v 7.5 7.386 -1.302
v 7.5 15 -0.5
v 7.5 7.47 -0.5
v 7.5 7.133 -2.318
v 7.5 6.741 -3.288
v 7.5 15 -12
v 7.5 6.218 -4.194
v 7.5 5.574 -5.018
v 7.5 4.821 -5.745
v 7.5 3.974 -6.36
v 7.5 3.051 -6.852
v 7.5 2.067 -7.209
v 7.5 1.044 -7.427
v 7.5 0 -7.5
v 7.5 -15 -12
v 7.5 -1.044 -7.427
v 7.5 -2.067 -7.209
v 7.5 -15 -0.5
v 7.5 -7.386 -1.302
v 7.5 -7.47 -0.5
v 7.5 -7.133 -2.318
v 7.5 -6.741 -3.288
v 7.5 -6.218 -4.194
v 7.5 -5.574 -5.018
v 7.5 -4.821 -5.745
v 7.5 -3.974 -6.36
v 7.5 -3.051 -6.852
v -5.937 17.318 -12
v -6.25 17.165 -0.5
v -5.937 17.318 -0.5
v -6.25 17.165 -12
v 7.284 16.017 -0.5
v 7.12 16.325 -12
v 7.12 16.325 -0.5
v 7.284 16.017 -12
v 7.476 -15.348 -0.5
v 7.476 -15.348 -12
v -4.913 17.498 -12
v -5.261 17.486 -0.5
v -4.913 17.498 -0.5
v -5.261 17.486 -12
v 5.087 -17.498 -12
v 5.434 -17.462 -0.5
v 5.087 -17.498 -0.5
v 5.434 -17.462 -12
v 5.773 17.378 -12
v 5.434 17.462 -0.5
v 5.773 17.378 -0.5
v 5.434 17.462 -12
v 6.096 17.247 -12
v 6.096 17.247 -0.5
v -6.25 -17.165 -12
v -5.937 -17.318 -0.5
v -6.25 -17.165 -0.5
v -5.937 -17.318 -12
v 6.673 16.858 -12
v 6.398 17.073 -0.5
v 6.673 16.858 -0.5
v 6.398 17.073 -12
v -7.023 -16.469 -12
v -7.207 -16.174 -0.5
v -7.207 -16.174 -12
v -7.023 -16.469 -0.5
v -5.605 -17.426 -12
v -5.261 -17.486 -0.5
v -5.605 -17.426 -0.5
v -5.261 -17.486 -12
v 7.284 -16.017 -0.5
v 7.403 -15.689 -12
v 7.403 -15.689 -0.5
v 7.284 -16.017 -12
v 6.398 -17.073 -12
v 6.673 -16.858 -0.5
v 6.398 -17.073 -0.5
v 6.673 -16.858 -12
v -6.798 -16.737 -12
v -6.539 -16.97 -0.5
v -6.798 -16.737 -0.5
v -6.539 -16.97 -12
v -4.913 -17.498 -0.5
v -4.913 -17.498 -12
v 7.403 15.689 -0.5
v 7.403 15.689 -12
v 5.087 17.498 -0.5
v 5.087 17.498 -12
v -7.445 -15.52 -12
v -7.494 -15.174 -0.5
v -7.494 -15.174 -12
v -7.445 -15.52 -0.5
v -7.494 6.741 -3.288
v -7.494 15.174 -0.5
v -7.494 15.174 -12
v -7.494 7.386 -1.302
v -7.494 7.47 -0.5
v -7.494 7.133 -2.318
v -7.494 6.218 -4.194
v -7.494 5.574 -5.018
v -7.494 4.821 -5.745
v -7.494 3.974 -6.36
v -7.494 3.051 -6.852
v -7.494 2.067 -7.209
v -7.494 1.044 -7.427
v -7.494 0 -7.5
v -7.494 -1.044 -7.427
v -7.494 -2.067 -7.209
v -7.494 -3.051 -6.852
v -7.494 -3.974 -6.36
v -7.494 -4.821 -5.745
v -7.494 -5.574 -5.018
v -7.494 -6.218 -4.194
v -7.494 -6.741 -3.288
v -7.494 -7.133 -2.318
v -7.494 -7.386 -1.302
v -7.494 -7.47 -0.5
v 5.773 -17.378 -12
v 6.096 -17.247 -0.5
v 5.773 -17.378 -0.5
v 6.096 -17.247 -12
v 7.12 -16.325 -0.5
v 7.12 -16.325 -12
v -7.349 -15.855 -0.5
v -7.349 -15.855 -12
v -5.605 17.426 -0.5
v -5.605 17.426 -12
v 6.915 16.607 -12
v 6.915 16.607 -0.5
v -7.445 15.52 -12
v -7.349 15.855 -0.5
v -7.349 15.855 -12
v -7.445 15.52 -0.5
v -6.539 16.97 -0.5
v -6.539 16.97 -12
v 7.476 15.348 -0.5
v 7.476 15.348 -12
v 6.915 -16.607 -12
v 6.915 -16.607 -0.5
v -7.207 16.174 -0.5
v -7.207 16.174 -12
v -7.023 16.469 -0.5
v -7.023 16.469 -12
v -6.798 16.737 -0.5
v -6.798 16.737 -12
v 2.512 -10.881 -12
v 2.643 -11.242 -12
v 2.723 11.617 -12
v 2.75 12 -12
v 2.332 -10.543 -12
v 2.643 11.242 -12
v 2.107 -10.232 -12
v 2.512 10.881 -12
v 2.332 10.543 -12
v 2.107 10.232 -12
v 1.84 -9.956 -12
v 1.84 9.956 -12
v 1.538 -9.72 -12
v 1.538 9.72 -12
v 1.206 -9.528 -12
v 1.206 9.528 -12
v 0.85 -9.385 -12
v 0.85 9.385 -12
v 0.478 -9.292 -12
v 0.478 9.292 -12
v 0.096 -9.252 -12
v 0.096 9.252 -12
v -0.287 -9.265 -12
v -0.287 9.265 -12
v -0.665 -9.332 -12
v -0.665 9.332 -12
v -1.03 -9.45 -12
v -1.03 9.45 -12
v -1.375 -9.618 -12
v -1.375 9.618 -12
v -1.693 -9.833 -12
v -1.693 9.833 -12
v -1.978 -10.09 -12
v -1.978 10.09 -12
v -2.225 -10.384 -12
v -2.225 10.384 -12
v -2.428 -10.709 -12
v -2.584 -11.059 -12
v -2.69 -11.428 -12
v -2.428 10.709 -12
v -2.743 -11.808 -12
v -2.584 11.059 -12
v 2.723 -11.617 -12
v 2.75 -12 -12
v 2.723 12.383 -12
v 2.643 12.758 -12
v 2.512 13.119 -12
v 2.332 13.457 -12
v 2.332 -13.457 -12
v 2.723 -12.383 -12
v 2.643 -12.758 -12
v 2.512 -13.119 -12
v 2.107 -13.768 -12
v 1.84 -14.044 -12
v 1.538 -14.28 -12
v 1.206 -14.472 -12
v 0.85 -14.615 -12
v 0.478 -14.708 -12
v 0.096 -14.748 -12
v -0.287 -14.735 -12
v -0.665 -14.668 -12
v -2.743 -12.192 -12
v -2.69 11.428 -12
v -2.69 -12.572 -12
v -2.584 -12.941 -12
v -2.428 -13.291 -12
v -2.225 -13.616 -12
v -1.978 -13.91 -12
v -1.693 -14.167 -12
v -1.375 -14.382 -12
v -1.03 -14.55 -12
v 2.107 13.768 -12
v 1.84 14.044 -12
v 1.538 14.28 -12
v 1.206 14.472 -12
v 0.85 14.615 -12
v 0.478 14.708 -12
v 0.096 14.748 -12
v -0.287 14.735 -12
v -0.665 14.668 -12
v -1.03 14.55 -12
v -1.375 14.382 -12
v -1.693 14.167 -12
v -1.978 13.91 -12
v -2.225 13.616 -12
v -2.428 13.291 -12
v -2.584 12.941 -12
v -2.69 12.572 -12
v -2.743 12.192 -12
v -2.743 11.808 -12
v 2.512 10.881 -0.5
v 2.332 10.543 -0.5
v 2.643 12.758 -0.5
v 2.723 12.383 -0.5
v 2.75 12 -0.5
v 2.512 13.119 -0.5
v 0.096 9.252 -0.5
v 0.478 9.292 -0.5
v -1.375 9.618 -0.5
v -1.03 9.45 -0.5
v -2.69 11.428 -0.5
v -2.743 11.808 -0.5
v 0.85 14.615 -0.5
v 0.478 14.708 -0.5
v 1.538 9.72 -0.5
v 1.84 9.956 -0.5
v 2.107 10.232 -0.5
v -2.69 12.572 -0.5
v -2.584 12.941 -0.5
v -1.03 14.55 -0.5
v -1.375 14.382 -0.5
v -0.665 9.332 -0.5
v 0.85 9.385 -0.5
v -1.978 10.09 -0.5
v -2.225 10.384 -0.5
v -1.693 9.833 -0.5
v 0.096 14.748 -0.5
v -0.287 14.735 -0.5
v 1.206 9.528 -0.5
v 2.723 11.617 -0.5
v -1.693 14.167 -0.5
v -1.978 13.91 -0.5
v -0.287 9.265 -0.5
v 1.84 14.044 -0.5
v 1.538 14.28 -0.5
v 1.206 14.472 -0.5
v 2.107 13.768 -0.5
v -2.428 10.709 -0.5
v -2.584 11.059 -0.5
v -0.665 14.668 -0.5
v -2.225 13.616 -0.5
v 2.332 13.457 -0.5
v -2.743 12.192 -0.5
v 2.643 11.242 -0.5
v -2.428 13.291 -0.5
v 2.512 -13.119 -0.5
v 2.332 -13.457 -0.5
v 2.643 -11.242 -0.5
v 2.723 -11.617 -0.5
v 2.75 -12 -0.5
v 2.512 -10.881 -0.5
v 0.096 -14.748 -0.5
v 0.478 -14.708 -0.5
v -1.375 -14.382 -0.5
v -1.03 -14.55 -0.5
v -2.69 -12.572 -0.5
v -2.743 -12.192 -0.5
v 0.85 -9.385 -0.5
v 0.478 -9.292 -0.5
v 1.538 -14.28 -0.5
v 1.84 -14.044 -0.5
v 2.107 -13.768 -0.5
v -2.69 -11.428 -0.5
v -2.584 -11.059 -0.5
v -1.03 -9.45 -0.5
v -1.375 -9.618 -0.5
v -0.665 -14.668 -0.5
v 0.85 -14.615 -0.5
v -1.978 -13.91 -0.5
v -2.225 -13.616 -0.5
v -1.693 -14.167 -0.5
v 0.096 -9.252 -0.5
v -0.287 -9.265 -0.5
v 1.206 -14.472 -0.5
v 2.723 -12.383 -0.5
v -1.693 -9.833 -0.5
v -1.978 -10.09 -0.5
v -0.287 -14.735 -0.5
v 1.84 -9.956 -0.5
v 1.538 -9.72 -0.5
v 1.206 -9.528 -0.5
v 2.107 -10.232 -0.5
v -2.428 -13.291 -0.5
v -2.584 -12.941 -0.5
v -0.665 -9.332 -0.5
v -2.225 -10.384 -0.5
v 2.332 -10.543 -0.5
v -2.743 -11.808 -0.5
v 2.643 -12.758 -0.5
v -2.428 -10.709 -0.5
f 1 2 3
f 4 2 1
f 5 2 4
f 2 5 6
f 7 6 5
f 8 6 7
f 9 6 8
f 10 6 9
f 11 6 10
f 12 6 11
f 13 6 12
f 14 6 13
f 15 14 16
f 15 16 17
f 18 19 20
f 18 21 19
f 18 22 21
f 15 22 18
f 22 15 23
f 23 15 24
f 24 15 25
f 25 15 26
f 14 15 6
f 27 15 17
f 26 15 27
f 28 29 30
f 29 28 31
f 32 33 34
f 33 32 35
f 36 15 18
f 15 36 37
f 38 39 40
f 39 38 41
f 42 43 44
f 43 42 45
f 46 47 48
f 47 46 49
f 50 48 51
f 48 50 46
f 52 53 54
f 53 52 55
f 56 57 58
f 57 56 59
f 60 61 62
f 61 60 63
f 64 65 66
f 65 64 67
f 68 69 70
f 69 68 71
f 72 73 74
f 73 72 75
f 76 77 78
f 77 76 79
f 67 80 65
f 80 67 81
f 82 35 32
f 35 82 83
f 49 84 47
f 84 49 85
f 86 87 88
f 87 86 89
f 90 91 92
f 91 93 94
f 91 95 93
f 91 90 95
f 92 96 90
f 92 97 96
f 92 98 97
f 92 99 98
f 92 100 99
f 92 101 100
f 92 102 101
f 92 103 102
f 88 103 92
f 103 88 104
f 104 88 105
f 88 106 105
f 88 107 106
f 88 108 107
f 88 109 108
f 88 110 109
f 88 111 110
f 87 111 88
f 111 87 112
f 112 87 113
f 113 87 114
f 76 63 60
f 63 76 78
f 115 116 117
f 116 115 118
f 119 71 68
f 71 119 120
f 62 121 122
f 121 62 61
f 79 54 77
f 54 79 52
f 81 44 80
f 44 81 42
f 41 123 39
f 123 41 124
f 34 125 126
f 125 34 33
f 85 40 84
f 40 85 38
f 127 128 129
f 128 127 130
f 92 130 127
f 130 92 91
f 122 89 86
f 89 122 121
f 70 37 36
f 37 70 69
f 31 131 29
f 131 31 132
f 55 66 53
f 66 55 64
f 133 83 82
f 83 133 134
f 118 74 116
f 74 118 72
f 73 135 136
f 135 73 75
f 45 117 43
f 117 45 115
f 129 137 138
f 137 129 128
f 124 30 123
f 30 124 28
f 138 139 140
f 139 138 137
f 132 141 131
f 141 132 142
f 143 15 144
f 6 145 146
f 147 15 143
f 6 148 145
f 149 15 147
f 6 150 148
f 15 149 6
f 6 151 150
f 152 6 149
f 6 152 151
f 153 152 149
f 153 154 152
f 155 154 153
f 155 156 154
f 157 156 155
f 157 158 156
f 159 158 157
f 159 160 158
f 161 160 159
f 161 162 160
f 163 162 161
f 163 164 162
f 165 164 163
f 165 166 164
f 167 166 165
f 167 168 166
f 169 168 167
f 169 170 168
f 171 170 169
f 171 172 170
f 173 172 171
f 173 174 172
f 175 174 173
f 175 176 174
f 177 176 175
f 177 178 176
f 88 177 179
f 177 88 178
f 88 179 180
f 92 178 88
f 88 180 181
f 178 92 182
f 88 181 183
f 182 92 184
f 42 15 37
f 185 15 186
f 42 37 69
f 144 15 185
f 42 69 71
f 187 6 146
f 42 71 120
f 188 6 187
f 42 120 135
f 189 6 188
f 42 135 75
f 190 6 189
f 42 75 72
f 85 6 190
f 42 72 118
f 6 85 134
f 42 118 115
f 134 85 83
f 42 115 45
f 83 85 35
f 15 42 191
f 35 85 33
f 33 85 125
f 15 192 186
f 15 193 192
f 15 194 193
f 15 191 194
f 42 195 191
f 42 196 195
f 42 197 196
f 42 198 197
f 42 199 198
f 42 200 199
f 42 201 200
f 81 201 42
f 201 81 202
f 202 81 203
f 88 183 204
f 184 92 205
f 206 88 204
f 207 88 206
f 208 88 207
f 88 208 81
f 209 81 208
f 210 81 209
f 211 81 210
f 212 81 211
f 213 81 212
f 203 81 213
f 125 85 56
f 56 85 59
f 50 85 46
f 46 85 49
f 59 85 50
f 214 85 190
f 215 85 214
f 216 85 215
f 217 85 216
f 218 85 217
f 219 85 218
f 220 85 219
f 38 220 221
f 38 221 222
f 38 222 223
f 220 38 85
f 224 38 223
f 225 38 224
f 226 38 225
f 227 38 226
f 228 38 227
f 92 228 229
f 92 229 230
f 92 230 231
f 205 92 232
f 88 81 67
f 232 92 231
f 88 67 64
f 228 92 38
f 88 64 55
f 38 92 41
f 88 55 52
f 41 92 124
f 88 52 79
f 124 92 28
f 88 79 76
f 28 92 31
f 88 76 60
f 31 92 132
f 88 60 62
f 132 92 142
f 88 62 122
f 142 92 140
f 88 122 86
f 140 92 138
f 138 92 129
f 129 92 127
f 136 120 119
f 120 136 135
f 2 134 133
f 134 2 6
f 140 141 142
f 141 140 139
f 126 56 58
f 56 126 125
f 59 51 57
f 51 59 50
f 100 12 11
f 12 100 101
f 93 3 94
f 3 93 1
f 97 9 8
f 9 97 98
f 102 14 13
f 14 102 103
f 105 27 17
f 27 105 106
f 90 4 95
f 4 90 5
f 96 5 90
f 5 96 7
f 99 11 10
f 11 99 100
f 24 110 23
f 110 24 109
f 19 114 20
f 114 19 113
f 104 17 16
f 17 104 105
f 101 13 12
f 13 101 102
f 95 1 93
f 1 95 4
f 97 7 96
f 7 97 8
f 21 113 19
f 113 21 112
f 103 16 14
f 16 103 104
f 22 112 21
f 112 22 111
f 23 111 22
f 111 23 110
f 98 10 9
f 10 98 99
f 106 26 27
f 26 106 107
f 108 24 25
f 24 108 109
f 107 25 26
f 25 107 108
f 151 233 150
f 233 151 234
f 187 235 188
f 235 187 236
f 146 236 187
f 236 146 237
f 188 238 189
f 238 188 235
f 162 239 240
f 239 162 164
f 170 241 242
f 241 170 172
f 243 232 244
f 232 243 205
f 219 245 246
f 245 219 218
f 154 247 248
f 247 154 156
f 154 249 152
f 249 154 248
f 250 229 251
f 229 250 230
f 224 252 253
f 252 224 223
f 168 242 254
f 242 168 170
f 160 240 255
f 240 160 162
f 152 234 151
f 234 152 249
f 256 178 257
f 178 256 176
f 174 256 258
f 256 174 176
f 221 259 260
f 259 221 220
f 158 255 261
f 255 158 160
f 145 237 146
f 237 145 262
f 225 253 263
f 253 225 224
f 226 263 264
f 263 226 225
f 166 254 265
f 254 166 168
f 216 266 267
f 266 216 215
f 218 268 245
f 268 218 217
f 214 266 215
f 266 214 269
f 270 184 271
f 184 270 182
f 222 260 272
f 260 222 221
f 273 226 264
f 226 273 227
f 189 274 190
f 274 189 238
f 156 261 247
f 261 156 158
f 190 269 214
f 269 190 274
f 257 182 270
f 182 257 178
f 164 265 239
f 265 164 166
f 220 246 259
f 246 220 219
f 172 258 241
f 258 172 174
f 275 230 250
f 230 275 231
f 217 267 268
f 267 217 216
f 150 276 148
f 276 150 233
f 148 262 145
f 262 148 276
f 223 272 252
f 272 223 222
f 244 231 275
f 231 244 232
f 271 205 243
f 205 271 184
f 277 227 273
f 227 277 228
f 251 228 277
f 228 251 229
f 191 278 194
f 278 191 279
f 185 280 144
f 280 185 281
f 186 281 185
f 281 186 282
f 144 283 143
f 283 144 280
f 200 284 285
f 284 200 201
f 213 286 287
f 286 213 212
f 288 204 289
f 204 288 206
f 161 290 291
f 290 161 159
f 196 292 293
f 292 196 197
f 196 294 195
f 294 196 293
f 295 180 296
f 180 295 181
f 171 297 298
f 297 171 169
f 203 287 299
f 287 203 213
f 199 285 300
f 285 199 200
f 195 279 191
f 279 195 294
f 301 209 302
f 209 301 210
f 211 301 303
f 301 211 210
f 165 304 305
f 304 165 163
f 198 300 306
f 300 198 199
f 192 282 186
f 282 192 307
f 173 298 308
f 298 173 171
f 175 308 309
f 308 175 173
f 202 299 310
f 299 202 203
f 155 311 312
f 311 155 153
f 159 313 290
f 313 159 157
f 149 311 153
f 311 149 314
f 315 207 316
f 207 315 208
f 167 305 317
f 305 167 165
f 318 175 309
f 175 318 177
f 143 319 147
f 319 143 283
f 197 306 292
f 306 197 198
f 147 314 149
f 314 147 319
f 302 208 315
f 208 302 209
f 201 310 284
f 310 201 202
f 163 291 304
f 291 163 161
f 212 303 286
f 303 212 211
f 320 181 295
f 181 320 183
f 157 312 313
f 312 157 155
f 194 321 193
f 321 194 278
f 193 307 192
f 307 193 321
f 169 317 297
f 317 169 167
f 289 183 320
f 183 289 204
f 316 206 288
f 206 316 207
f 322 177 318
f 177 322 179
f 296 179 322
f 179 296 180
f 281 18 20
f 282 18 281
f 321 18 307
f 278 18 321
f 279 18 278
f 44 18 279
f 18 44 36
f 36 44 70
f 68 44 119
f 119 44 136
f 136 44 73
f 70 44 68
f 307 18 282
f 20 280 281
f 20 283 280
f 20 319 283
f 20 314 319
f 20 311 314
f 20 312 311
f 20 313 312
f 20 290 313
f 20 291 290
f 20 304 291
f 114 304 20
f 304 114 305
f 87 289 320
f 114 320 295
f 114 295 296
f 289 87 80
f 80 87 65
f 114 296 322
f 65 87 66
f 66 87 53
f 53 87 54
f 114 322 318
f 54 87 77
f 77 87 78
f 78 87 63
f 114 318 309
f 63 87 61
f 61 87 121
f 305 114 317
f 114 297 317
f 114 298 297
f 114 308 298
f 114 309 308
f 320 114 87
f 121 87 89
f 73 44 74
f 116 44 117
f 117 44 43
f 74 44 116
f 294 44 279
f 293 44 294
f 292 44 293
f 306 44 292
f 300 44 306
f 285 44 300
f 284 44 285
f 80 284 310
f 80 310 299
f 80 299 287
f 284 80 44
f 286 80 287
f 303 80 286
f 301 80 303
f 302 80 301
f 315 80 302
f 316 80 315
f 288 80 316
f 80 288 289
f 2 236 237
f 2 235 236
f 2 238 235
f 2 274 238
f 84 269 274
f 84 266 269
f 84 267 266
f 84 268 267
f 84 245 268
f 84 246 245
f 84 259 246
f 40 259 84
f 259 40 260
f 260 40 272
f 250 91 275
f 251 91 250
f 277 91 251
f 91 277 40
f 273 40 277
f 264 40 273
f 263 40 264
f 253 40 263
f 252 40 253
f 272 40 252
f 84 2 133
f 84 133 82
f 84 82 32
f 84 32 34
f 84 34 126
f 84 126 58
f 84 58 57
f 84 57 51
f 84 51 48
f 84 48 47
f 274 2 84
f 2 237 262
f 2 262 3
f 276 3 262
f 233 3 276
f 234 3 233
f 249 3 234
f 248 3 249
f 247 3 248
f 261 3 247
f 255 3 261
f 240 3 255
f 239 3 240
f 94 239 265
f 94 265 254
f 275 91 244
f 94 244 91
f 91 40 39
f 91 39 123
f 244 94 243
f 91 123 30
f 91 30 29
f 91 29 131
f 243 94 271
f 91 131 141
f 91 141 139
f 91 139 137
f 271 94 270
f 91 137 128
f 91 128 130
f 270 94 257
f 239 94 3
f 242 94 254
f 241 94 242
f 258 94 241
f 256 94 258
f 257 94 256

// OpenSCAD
$fn=45;
difference() {
  translate([0, 0, -0.5]) minkowski() {
    cube([10,30,23], center=true);
    cylinder(h = 1, r = 2.5);
  }
  rotate([0, 90, 0]) cylinder(h=17, r=7.5, center=true);
  translate([0, 12, 0]) cylinder(h = 27, r = 2.75, center=true);
  translate([0, -12, 0]) cylinder(h = 27, r = 2.75, center=true);
  translate([0, 0, 11.0]) cube([17,37,23], center=true);
}
